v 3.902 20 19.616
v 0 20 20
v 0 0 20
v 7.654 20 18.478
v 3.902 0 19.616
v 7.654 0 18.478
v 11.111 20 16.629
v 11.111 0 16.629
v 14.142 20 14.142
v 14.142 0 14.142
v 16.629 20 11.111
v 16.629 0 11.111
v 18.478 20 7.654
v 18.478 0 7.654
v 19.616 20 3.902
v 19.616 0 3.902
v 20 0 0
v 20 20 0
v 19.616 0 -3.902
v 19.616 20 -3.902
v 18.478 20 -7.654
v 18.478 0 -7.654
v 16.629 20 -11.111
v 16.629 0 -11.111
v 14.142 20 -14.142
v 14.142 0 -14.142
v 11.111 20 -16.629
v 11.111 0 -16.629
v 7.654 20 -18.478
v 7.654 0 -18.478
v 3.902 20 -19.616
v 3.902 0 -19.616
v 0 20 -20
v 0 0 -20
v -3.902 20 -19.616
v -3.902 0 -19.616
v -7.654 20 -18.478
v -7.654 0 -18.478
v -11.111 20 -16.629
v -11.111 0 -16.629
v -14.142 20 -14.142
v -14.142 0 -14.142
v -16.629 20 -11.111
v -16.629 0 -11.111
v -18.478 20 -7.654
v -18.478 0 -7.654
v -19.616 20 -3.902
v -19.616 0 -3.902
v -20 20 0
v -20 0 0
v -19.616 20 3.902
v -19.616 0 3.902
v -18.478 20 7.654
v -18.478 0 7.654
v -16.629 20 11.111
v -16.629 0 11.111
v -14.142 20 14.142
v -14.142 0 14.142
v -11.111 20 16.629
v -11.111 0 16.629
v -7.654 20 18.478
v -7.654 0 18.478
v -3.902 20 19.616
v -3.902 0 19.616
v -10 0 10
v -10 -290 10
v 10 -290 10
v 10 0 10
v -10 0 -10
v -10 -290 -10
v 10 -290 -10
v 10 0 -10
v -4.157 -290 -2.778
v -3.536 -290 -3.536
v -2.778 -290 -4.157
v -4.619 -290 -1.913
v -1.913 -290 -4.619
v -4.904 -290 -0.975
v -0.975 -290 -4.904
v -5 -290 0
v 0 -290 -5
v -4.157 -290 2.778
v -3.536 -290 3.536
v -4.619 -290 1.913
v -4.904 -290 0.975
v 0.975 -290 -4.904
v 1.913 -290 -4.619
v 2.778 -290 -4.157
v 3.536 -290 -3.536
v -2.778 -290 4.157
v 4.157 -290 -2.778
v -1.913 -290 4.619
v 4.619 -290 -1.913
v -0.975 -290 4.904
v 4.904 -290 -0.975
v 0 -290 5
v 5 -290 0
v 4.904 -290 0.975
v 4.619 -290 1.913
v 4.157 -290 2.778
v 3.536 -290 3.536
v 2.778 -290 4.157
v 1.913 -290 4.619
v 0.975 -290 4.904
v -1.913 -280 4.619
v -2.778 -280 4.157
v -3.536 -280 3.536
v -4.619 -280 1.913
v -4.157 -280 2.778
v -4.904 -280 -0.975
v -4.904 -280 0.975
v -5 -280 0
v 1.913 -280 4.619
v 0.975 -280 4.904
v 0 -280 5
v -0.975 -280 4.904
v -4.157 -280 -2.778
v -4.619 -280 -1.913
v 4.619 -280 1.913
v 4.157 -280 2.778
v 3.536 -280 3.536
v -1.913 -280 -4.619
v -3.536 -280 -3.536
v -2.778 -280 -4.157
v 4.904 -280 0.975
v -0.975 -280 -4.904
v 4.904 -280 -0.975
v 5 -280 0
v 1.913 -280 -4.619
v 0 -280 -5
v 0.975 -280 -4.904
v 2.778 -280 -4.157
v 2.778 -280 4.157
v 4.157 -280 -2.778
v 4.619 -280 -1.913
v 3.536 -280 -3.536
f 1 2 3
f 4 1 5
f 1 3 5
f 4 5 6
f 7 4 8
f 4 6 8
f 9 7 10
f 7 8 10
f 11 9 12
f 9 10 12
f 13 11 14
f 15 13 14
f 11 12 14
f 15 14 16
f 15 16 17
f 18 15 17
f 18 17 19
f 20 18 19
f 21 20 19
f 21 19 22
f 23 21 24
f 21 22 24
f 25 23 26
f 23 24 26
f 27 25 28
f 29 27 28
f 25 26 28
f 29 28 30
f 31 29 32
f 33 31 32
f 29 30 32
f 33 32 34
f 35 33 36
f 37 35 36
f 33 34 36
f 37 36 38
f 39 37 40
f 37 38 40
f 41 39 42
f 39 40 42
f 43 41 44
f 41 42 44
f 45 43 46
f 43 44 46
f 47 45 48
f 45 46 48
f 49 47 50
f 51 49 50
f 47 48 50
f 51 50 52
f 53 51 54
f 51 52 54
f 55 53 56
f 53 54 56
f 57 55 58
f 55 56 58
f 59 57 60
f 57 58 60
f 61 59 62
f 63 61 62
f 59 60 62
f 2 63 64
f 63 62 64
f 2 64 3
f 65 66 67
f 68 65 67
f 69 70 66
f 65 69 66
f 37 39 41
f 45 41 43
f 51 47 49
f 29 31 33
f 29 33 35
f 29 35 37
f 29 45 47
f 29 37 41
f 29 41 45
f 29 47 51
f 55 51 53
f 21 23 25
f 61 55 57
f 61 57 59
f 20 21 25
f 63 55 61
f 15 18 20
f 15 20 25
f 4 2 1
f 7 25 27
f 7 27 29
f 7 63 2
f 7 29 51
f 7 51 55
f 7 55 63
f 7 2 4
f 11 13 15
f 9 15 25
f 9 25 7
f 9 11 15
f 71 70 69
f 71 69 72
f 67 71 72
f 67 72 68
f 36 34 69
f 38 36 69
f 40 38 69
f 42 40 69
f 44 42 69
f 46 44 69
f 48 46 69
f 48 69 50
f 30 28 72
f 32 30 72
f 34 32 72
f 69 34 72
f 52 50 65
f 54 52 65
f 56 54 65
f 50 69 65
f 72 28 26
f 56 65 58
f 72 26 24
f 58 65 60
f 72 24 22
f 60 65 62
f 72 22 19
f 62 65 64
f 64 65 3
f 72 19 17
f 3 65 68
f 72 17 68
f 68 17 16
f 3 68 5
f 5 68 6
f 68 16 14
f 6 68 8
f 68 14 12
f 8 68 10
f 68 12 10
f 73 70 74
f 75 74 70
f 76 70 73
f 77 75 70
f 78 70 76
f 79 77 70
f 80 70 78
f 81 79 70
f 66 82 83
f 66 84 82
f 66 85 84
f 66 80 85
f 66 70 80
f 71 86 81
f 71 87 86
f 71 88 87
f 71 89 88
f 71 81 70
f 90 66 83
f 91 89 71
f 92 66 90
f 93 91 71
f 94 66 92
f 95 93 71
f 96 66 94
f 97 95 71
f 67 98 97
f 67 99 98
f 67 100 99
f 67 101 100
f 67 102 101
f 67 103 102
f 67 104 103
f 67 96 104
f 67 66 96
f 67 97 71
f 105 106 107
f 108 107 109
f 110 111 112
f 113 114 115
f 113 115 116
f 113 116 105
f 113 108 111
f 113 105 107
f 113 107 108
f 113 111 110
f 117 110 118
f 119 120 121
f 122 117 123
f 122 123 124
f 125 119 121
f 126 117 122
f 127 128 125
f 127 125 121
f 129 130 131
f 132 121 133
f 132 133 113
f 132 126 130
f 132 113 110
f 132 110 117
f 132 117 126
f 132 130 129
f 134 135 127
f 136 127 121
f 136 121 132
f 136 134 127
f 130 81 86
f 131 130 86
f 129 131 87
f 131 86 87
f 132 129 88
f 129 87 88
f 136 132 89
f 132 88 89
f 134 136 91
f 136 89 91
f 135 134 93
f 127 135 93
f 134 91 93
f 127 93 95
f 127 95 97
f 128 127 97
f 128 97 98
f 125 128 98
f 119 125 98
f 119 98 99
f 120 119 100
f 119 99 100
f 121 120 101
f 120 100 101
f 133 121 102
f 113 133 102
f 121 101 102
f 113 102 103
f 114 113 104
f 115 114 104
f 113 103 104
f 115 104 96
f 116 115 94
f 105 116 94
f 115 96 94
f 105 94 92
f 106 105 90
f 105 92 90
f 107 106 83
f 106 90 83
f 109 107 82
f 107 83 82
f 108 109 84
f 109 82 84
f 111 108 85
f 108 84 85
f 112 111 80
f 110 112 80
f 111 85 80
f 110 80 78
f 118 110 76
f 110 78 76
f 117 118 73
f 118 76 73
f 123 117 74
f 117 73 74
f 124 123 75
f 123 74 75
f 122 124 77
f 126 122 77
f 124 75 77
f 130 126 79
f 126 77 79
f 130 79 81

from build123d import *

# Parameters (mm, degrees)
SKETCH2_R           = 20
BOSS_EXTRUDE1_DEPTH = 20
SKETCH3_W           = 20
SKETCH3_H           = 20
BOSS_EXTRUDE2_DEPTH = 290
SKETCH4_R           = 5
CUT_EXTRUDE1_DEPTH  = 10


with BuildPart() as part:
    # Sketch2 → Boss-Extrude1 (new body)
    with BuildSketch(Plane(origin=(0, 0, 0), x_dir=(1, 0, 0), z_dir=(0, 1, 0))):
        with Locations(Location((0, 0, 0), (0, 0, 270))):
            Circle(SKETCH2_R)
    extrude(amount=BOSS_EXTRUDE1_DEPTH)

    # Sketch3 → Boss-Extrude2 (add)
    with BuildSketch(Plane.XZ):
        Rectangle(SKETCH3_W, SKETCH3_H)
    extrude(amount=BOSS_EXTRUDE2_DEPTH)

    # Sketch4 → Cut-Extrude1 (cut)
    with BuildSketch(Plane.XZ.offset(290)):
        with Locations(Location((0, 0, 0), (0, 0, 270))):
            Circle(SKETCH4_R)
    extrude(amount=-CUT_EXTRUDE1_DEPTH, mode=Mode.SUBTRACT)


solid = part.part
